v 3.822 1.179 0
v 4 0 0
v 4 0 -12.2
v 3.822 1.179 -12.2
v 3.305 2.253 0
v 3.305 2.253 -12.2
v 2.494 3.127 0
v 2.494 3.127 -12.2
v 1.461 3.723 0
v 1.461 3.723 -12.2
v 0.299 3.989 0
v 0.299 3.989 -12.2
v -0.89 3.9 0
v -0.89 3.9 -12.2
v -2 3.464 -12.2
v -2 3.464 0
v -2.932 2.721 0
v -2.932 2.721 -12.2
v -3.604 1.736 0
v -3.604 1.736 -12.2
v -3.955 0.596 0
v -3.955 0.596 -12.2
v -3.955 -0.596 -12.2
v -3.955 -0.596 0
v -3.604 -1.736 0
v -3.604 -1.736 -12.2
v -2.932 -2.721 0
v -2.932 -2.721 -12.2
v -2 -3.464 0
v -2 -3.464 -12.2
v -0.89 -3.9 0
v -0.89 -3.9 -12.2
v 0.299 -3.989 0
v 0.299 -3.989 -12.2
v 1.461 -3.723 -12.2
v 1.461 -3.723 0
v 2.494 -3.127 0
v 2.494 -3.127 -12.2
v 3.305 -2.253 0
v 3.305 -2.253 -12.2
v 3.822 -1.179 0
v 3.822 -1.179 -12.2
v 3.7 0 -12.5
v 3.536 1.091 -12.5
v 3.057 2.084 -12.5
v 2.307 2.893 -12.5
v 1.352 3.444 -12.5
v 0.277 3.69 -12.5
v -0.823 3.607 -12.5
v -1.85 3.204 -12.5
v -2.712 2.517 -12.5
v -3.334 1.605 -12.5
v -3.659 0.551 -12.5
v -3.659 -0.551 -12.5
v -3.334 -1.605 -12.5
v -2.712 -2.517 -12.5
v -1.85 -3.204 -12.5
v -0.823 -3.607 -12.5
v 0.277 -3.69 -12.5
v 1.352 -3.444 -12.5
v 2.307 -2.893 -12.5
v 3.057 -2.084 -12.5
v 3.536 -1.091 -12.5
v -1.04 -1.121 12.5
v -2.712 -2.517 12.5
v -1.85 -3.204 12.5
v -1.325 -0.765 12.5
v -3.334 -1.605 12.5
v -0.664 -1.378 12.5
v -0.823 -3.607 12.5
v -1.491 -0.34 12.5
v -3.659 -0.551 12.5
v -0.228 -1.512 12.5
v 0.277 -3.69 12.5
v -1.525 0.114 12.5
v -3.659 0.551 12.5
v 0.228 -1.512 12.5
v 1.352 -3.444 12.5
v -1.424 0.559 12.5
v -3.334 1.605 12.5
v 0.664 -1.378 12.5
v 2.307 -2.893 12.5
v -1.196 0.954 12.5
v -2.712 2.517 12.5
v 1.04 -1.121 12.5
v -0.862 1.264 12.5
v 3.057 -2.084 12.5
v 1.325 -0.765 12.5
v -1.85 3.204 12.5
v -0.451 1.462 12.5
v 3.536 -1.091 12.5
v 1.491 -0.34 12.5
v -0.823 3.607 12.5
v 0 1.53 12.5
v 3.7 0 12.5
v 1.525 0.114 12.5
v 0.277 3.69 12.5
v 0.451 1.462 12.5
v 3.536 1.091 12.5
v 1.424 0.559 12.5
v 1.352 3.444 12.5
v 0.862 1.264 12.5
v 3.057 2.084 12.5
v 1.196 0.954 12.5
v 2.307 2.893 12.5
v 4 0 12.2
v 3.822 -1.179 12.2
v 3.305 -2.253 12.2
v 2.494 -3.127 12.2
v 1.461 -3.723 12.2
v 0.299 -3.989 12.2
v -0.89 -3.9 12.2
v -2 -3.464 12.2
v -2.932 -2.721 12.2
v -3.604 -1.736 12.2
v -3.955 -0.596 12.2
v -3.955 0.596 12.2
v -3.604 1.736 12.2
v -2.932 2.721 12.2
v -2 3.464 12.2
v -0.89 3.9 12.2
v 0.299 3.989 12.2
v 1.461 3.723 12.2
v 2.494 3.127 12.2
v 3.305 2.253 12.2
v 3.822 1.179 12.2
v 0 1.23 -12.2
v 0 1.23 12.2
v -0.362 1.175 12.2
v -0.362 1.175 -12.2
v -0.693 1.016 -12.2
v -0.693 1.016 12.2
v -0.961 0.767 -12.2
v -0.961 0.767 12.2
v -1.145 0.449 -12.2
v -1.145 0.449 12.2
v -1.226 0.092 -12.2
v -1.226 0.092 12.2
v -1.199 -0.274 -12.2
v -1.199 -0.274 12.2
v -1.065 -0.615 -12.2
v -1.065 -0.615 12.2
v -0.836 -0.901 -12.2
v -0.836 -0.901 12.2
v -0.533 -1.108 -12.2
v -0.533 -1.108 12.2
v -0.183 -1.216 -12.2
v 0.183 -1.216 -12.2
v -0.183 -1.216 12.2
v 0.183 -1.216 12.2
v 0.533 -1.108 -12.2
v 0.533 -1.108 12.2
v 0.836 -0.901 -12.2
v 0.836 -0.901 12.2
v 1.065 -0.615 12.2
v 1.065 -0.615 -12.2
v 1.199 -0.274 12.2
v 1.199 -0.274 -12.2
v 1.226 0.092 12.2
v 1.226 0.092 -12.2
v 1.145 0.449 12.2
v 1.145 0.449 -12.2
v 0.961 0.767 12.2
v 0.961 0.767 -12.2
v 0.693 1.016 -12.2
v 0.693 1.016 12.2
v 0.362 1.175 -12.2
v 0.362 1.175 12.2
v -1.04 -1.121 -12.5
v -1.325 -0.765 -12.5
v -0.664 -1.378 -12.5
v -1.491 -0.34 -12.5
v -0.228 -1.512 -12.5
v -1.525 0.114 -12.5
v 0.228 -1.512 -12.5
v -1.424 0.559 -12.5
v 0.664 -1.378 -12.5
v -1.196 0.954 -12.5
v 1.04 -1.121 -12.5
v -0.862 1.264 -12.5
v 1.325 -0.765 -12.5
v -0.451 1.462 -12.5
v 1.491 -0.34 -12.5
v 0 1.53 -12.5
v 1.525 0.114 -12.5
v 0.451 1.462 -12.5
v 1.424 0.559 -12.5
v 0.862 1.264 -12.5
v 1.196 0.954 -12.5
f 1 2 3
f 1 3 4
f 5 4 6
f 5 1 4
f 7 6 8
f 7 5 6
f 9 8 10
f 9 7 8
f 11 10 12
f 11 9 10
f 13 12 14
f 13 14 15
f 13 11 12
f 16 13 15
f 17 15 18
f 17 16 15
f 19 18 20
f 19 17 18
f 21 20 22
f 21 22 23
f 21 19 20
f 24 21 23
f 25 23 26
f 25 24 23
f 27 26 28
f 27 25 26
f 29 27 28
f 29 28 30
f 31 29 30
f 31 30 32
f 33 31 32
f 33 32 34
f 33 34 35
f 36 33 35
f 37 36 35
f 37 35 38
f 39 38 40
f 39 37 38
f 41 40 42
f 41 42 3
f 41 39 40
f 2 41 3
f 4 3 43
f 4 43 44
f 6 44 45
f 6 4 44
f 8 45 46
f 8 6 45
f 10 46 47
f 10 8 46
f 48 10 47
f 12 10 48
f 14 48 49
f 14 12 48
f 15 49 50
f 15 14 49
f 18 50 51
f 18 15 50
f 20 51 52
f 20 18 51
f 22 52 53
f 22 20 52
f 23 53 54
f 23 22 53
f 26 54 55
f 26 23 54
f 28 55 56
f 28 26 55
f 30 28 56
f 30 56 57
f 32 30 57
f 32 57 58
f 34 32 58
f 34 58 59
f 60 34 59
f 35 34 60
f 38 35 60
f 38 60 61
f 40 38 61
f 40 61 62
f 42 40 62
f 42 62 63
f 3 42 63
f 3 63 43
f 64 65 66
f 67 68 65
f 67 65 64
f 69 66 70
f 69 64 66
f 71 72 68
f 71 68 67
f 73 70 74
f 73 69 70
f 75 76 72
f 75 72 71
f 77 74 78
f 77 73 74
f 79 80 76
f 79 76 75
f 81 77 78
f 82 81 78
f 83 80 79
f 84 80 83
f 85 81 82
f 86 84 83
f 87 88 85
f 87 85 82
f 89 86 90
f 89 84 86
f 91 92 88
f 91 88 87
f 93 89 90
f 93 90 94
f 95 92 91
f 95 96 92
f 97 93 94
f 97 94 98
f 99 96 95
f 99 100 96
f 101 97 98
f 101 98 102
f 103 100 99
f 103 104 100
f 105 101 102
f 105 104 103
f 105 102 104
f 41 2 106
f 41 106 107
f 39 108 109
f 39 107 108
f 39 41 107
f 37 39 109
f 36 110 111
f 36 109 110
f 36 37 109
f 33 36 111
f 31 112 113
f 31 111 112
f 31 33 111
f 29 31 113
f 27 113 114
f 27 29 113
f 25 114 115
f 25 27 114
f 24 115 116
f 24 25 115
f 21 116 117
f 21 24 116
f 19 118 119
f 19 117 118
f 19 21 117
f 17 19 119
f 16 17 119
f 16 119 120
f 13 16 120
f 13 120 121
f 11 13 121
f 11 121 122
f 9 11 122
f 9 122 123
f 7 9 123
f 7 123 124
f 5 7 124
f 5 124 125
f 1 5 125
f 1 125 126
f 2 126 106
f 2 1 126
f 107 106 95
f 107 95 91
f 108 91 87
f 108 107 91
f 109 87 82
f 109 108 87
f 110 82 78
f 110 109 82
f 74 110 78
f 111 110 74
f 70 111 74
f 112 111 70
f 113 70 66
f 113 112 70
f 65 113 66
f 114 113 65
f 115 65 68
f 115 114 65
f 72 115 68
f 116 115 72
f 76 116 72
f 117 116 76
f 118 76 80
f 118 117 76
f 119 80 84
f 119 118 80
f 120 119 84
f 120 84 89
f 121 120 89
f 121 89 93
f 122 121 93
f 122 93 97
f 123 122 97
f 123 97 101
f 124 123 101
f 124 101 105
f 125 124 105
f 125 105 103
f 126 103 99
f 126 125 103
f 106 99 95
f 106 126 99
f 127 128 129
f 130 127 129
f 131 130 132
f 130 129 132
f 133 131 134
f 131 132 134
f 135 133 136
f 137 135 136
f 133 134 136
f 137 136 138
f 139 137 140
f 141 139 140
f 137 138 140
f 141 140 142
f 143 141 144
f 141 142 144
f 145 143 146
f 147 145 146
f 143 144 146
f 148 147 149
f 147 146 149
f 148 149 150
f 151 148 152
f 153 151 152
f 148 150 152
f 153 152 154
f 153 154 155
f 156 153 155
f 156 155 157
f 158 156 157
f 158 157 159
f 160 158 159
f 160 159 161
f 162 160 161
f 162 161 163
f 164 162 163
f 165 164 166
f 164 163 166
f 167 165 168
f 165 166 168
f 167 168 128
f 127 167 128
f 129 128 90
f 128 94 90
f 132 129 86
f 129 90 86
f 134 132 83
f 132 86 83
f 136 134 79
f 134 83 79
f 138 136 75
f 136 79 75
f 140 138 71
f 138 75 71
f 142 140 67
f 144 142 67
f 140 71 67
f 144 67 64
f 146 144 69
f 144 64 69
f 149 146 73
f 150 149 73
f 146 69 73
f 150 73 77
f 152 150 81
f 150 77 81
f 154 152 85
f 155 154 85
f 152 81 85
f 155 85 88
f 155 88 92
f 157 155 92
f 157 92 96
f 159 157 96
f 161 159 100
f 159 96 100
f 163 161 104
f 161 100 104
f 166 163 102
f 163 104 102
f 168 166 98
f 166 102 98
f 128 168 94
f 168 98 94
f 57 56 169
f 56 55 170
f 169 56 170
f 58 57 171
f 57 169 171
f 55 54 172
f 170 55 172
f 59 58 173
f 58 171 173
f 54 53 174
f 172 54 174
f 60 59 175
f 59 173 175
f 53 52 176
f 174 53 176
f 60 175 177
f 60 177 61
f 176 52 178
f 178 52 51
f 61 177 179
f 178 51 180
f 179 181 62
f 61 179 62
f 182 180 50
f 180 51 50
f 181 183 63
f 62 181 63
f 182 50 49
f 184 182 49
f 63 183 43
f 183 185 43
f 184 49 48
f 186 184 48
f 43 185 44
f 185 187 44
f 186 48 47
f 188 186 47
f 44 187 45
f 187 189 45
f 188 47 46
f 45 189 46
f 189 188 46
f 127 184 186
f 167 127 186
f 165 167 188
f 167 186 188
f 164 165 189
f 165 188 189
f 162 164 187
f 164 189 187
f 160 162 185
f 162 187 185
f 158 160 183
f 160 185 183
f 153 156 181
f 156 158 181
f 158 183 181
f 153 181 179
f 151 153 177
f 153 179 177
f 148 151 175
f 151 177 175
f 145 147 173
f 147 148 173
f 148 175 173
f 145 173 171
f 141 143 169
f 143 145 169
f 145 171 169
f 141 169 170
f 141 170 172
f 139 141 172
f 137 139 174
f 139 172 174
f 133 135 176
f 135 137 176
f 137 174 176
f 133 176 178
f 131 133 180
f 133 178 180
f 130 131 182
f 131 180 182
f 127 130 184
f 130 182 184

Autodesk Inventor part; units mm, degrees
ref_plane "YZ Plane" through (0, 0, 0) normal (1, 0, 0) x (0, 1, 0)
ref_plane "XZ Plane" through (0, 0, 0) normal (0, 1, 0) x (-1, 0, 0)
ref_plane "XY Plane" through (0, 0, 0) normal (0, 0, 1) x (1, 0, 0)
sketch "スケッチ1" plane through (0, 0, 0) normal (0, 0, 1) x (1, 0, 0)
  circle A0 centre (0, 0) radius 4
  dimension "d0" = 8
extrude "押し出し1" add sketch "スケッチ1" along normal mid plane 25
sketch "スケッチ2" plane through (0, 0, -12.5) normal (0, 0, -1) x (-1, 0, 0)
  point P0 (0, 0)
hole "穴1" at (0, 0, -12.5) direction (0, 0, 1) diameter 2.459 end through all thread size "M3x0.5" class "6H" standard "ISO Metric profile"
thread "ねじ1" size "M3x0.5" class "6H" standard "ANSI Metric M Profile" full length
chamfer "面取り1" distance 0.3 angle 45 4 edges at (0, -1.2295, -12.5) (-4, 0, -12.5) (0, -1.2295, 12.5) (-4, 0, 12.5)
properties part number "ラックギア側ベアリング軸" material "アルミニウム 2014-T4"
